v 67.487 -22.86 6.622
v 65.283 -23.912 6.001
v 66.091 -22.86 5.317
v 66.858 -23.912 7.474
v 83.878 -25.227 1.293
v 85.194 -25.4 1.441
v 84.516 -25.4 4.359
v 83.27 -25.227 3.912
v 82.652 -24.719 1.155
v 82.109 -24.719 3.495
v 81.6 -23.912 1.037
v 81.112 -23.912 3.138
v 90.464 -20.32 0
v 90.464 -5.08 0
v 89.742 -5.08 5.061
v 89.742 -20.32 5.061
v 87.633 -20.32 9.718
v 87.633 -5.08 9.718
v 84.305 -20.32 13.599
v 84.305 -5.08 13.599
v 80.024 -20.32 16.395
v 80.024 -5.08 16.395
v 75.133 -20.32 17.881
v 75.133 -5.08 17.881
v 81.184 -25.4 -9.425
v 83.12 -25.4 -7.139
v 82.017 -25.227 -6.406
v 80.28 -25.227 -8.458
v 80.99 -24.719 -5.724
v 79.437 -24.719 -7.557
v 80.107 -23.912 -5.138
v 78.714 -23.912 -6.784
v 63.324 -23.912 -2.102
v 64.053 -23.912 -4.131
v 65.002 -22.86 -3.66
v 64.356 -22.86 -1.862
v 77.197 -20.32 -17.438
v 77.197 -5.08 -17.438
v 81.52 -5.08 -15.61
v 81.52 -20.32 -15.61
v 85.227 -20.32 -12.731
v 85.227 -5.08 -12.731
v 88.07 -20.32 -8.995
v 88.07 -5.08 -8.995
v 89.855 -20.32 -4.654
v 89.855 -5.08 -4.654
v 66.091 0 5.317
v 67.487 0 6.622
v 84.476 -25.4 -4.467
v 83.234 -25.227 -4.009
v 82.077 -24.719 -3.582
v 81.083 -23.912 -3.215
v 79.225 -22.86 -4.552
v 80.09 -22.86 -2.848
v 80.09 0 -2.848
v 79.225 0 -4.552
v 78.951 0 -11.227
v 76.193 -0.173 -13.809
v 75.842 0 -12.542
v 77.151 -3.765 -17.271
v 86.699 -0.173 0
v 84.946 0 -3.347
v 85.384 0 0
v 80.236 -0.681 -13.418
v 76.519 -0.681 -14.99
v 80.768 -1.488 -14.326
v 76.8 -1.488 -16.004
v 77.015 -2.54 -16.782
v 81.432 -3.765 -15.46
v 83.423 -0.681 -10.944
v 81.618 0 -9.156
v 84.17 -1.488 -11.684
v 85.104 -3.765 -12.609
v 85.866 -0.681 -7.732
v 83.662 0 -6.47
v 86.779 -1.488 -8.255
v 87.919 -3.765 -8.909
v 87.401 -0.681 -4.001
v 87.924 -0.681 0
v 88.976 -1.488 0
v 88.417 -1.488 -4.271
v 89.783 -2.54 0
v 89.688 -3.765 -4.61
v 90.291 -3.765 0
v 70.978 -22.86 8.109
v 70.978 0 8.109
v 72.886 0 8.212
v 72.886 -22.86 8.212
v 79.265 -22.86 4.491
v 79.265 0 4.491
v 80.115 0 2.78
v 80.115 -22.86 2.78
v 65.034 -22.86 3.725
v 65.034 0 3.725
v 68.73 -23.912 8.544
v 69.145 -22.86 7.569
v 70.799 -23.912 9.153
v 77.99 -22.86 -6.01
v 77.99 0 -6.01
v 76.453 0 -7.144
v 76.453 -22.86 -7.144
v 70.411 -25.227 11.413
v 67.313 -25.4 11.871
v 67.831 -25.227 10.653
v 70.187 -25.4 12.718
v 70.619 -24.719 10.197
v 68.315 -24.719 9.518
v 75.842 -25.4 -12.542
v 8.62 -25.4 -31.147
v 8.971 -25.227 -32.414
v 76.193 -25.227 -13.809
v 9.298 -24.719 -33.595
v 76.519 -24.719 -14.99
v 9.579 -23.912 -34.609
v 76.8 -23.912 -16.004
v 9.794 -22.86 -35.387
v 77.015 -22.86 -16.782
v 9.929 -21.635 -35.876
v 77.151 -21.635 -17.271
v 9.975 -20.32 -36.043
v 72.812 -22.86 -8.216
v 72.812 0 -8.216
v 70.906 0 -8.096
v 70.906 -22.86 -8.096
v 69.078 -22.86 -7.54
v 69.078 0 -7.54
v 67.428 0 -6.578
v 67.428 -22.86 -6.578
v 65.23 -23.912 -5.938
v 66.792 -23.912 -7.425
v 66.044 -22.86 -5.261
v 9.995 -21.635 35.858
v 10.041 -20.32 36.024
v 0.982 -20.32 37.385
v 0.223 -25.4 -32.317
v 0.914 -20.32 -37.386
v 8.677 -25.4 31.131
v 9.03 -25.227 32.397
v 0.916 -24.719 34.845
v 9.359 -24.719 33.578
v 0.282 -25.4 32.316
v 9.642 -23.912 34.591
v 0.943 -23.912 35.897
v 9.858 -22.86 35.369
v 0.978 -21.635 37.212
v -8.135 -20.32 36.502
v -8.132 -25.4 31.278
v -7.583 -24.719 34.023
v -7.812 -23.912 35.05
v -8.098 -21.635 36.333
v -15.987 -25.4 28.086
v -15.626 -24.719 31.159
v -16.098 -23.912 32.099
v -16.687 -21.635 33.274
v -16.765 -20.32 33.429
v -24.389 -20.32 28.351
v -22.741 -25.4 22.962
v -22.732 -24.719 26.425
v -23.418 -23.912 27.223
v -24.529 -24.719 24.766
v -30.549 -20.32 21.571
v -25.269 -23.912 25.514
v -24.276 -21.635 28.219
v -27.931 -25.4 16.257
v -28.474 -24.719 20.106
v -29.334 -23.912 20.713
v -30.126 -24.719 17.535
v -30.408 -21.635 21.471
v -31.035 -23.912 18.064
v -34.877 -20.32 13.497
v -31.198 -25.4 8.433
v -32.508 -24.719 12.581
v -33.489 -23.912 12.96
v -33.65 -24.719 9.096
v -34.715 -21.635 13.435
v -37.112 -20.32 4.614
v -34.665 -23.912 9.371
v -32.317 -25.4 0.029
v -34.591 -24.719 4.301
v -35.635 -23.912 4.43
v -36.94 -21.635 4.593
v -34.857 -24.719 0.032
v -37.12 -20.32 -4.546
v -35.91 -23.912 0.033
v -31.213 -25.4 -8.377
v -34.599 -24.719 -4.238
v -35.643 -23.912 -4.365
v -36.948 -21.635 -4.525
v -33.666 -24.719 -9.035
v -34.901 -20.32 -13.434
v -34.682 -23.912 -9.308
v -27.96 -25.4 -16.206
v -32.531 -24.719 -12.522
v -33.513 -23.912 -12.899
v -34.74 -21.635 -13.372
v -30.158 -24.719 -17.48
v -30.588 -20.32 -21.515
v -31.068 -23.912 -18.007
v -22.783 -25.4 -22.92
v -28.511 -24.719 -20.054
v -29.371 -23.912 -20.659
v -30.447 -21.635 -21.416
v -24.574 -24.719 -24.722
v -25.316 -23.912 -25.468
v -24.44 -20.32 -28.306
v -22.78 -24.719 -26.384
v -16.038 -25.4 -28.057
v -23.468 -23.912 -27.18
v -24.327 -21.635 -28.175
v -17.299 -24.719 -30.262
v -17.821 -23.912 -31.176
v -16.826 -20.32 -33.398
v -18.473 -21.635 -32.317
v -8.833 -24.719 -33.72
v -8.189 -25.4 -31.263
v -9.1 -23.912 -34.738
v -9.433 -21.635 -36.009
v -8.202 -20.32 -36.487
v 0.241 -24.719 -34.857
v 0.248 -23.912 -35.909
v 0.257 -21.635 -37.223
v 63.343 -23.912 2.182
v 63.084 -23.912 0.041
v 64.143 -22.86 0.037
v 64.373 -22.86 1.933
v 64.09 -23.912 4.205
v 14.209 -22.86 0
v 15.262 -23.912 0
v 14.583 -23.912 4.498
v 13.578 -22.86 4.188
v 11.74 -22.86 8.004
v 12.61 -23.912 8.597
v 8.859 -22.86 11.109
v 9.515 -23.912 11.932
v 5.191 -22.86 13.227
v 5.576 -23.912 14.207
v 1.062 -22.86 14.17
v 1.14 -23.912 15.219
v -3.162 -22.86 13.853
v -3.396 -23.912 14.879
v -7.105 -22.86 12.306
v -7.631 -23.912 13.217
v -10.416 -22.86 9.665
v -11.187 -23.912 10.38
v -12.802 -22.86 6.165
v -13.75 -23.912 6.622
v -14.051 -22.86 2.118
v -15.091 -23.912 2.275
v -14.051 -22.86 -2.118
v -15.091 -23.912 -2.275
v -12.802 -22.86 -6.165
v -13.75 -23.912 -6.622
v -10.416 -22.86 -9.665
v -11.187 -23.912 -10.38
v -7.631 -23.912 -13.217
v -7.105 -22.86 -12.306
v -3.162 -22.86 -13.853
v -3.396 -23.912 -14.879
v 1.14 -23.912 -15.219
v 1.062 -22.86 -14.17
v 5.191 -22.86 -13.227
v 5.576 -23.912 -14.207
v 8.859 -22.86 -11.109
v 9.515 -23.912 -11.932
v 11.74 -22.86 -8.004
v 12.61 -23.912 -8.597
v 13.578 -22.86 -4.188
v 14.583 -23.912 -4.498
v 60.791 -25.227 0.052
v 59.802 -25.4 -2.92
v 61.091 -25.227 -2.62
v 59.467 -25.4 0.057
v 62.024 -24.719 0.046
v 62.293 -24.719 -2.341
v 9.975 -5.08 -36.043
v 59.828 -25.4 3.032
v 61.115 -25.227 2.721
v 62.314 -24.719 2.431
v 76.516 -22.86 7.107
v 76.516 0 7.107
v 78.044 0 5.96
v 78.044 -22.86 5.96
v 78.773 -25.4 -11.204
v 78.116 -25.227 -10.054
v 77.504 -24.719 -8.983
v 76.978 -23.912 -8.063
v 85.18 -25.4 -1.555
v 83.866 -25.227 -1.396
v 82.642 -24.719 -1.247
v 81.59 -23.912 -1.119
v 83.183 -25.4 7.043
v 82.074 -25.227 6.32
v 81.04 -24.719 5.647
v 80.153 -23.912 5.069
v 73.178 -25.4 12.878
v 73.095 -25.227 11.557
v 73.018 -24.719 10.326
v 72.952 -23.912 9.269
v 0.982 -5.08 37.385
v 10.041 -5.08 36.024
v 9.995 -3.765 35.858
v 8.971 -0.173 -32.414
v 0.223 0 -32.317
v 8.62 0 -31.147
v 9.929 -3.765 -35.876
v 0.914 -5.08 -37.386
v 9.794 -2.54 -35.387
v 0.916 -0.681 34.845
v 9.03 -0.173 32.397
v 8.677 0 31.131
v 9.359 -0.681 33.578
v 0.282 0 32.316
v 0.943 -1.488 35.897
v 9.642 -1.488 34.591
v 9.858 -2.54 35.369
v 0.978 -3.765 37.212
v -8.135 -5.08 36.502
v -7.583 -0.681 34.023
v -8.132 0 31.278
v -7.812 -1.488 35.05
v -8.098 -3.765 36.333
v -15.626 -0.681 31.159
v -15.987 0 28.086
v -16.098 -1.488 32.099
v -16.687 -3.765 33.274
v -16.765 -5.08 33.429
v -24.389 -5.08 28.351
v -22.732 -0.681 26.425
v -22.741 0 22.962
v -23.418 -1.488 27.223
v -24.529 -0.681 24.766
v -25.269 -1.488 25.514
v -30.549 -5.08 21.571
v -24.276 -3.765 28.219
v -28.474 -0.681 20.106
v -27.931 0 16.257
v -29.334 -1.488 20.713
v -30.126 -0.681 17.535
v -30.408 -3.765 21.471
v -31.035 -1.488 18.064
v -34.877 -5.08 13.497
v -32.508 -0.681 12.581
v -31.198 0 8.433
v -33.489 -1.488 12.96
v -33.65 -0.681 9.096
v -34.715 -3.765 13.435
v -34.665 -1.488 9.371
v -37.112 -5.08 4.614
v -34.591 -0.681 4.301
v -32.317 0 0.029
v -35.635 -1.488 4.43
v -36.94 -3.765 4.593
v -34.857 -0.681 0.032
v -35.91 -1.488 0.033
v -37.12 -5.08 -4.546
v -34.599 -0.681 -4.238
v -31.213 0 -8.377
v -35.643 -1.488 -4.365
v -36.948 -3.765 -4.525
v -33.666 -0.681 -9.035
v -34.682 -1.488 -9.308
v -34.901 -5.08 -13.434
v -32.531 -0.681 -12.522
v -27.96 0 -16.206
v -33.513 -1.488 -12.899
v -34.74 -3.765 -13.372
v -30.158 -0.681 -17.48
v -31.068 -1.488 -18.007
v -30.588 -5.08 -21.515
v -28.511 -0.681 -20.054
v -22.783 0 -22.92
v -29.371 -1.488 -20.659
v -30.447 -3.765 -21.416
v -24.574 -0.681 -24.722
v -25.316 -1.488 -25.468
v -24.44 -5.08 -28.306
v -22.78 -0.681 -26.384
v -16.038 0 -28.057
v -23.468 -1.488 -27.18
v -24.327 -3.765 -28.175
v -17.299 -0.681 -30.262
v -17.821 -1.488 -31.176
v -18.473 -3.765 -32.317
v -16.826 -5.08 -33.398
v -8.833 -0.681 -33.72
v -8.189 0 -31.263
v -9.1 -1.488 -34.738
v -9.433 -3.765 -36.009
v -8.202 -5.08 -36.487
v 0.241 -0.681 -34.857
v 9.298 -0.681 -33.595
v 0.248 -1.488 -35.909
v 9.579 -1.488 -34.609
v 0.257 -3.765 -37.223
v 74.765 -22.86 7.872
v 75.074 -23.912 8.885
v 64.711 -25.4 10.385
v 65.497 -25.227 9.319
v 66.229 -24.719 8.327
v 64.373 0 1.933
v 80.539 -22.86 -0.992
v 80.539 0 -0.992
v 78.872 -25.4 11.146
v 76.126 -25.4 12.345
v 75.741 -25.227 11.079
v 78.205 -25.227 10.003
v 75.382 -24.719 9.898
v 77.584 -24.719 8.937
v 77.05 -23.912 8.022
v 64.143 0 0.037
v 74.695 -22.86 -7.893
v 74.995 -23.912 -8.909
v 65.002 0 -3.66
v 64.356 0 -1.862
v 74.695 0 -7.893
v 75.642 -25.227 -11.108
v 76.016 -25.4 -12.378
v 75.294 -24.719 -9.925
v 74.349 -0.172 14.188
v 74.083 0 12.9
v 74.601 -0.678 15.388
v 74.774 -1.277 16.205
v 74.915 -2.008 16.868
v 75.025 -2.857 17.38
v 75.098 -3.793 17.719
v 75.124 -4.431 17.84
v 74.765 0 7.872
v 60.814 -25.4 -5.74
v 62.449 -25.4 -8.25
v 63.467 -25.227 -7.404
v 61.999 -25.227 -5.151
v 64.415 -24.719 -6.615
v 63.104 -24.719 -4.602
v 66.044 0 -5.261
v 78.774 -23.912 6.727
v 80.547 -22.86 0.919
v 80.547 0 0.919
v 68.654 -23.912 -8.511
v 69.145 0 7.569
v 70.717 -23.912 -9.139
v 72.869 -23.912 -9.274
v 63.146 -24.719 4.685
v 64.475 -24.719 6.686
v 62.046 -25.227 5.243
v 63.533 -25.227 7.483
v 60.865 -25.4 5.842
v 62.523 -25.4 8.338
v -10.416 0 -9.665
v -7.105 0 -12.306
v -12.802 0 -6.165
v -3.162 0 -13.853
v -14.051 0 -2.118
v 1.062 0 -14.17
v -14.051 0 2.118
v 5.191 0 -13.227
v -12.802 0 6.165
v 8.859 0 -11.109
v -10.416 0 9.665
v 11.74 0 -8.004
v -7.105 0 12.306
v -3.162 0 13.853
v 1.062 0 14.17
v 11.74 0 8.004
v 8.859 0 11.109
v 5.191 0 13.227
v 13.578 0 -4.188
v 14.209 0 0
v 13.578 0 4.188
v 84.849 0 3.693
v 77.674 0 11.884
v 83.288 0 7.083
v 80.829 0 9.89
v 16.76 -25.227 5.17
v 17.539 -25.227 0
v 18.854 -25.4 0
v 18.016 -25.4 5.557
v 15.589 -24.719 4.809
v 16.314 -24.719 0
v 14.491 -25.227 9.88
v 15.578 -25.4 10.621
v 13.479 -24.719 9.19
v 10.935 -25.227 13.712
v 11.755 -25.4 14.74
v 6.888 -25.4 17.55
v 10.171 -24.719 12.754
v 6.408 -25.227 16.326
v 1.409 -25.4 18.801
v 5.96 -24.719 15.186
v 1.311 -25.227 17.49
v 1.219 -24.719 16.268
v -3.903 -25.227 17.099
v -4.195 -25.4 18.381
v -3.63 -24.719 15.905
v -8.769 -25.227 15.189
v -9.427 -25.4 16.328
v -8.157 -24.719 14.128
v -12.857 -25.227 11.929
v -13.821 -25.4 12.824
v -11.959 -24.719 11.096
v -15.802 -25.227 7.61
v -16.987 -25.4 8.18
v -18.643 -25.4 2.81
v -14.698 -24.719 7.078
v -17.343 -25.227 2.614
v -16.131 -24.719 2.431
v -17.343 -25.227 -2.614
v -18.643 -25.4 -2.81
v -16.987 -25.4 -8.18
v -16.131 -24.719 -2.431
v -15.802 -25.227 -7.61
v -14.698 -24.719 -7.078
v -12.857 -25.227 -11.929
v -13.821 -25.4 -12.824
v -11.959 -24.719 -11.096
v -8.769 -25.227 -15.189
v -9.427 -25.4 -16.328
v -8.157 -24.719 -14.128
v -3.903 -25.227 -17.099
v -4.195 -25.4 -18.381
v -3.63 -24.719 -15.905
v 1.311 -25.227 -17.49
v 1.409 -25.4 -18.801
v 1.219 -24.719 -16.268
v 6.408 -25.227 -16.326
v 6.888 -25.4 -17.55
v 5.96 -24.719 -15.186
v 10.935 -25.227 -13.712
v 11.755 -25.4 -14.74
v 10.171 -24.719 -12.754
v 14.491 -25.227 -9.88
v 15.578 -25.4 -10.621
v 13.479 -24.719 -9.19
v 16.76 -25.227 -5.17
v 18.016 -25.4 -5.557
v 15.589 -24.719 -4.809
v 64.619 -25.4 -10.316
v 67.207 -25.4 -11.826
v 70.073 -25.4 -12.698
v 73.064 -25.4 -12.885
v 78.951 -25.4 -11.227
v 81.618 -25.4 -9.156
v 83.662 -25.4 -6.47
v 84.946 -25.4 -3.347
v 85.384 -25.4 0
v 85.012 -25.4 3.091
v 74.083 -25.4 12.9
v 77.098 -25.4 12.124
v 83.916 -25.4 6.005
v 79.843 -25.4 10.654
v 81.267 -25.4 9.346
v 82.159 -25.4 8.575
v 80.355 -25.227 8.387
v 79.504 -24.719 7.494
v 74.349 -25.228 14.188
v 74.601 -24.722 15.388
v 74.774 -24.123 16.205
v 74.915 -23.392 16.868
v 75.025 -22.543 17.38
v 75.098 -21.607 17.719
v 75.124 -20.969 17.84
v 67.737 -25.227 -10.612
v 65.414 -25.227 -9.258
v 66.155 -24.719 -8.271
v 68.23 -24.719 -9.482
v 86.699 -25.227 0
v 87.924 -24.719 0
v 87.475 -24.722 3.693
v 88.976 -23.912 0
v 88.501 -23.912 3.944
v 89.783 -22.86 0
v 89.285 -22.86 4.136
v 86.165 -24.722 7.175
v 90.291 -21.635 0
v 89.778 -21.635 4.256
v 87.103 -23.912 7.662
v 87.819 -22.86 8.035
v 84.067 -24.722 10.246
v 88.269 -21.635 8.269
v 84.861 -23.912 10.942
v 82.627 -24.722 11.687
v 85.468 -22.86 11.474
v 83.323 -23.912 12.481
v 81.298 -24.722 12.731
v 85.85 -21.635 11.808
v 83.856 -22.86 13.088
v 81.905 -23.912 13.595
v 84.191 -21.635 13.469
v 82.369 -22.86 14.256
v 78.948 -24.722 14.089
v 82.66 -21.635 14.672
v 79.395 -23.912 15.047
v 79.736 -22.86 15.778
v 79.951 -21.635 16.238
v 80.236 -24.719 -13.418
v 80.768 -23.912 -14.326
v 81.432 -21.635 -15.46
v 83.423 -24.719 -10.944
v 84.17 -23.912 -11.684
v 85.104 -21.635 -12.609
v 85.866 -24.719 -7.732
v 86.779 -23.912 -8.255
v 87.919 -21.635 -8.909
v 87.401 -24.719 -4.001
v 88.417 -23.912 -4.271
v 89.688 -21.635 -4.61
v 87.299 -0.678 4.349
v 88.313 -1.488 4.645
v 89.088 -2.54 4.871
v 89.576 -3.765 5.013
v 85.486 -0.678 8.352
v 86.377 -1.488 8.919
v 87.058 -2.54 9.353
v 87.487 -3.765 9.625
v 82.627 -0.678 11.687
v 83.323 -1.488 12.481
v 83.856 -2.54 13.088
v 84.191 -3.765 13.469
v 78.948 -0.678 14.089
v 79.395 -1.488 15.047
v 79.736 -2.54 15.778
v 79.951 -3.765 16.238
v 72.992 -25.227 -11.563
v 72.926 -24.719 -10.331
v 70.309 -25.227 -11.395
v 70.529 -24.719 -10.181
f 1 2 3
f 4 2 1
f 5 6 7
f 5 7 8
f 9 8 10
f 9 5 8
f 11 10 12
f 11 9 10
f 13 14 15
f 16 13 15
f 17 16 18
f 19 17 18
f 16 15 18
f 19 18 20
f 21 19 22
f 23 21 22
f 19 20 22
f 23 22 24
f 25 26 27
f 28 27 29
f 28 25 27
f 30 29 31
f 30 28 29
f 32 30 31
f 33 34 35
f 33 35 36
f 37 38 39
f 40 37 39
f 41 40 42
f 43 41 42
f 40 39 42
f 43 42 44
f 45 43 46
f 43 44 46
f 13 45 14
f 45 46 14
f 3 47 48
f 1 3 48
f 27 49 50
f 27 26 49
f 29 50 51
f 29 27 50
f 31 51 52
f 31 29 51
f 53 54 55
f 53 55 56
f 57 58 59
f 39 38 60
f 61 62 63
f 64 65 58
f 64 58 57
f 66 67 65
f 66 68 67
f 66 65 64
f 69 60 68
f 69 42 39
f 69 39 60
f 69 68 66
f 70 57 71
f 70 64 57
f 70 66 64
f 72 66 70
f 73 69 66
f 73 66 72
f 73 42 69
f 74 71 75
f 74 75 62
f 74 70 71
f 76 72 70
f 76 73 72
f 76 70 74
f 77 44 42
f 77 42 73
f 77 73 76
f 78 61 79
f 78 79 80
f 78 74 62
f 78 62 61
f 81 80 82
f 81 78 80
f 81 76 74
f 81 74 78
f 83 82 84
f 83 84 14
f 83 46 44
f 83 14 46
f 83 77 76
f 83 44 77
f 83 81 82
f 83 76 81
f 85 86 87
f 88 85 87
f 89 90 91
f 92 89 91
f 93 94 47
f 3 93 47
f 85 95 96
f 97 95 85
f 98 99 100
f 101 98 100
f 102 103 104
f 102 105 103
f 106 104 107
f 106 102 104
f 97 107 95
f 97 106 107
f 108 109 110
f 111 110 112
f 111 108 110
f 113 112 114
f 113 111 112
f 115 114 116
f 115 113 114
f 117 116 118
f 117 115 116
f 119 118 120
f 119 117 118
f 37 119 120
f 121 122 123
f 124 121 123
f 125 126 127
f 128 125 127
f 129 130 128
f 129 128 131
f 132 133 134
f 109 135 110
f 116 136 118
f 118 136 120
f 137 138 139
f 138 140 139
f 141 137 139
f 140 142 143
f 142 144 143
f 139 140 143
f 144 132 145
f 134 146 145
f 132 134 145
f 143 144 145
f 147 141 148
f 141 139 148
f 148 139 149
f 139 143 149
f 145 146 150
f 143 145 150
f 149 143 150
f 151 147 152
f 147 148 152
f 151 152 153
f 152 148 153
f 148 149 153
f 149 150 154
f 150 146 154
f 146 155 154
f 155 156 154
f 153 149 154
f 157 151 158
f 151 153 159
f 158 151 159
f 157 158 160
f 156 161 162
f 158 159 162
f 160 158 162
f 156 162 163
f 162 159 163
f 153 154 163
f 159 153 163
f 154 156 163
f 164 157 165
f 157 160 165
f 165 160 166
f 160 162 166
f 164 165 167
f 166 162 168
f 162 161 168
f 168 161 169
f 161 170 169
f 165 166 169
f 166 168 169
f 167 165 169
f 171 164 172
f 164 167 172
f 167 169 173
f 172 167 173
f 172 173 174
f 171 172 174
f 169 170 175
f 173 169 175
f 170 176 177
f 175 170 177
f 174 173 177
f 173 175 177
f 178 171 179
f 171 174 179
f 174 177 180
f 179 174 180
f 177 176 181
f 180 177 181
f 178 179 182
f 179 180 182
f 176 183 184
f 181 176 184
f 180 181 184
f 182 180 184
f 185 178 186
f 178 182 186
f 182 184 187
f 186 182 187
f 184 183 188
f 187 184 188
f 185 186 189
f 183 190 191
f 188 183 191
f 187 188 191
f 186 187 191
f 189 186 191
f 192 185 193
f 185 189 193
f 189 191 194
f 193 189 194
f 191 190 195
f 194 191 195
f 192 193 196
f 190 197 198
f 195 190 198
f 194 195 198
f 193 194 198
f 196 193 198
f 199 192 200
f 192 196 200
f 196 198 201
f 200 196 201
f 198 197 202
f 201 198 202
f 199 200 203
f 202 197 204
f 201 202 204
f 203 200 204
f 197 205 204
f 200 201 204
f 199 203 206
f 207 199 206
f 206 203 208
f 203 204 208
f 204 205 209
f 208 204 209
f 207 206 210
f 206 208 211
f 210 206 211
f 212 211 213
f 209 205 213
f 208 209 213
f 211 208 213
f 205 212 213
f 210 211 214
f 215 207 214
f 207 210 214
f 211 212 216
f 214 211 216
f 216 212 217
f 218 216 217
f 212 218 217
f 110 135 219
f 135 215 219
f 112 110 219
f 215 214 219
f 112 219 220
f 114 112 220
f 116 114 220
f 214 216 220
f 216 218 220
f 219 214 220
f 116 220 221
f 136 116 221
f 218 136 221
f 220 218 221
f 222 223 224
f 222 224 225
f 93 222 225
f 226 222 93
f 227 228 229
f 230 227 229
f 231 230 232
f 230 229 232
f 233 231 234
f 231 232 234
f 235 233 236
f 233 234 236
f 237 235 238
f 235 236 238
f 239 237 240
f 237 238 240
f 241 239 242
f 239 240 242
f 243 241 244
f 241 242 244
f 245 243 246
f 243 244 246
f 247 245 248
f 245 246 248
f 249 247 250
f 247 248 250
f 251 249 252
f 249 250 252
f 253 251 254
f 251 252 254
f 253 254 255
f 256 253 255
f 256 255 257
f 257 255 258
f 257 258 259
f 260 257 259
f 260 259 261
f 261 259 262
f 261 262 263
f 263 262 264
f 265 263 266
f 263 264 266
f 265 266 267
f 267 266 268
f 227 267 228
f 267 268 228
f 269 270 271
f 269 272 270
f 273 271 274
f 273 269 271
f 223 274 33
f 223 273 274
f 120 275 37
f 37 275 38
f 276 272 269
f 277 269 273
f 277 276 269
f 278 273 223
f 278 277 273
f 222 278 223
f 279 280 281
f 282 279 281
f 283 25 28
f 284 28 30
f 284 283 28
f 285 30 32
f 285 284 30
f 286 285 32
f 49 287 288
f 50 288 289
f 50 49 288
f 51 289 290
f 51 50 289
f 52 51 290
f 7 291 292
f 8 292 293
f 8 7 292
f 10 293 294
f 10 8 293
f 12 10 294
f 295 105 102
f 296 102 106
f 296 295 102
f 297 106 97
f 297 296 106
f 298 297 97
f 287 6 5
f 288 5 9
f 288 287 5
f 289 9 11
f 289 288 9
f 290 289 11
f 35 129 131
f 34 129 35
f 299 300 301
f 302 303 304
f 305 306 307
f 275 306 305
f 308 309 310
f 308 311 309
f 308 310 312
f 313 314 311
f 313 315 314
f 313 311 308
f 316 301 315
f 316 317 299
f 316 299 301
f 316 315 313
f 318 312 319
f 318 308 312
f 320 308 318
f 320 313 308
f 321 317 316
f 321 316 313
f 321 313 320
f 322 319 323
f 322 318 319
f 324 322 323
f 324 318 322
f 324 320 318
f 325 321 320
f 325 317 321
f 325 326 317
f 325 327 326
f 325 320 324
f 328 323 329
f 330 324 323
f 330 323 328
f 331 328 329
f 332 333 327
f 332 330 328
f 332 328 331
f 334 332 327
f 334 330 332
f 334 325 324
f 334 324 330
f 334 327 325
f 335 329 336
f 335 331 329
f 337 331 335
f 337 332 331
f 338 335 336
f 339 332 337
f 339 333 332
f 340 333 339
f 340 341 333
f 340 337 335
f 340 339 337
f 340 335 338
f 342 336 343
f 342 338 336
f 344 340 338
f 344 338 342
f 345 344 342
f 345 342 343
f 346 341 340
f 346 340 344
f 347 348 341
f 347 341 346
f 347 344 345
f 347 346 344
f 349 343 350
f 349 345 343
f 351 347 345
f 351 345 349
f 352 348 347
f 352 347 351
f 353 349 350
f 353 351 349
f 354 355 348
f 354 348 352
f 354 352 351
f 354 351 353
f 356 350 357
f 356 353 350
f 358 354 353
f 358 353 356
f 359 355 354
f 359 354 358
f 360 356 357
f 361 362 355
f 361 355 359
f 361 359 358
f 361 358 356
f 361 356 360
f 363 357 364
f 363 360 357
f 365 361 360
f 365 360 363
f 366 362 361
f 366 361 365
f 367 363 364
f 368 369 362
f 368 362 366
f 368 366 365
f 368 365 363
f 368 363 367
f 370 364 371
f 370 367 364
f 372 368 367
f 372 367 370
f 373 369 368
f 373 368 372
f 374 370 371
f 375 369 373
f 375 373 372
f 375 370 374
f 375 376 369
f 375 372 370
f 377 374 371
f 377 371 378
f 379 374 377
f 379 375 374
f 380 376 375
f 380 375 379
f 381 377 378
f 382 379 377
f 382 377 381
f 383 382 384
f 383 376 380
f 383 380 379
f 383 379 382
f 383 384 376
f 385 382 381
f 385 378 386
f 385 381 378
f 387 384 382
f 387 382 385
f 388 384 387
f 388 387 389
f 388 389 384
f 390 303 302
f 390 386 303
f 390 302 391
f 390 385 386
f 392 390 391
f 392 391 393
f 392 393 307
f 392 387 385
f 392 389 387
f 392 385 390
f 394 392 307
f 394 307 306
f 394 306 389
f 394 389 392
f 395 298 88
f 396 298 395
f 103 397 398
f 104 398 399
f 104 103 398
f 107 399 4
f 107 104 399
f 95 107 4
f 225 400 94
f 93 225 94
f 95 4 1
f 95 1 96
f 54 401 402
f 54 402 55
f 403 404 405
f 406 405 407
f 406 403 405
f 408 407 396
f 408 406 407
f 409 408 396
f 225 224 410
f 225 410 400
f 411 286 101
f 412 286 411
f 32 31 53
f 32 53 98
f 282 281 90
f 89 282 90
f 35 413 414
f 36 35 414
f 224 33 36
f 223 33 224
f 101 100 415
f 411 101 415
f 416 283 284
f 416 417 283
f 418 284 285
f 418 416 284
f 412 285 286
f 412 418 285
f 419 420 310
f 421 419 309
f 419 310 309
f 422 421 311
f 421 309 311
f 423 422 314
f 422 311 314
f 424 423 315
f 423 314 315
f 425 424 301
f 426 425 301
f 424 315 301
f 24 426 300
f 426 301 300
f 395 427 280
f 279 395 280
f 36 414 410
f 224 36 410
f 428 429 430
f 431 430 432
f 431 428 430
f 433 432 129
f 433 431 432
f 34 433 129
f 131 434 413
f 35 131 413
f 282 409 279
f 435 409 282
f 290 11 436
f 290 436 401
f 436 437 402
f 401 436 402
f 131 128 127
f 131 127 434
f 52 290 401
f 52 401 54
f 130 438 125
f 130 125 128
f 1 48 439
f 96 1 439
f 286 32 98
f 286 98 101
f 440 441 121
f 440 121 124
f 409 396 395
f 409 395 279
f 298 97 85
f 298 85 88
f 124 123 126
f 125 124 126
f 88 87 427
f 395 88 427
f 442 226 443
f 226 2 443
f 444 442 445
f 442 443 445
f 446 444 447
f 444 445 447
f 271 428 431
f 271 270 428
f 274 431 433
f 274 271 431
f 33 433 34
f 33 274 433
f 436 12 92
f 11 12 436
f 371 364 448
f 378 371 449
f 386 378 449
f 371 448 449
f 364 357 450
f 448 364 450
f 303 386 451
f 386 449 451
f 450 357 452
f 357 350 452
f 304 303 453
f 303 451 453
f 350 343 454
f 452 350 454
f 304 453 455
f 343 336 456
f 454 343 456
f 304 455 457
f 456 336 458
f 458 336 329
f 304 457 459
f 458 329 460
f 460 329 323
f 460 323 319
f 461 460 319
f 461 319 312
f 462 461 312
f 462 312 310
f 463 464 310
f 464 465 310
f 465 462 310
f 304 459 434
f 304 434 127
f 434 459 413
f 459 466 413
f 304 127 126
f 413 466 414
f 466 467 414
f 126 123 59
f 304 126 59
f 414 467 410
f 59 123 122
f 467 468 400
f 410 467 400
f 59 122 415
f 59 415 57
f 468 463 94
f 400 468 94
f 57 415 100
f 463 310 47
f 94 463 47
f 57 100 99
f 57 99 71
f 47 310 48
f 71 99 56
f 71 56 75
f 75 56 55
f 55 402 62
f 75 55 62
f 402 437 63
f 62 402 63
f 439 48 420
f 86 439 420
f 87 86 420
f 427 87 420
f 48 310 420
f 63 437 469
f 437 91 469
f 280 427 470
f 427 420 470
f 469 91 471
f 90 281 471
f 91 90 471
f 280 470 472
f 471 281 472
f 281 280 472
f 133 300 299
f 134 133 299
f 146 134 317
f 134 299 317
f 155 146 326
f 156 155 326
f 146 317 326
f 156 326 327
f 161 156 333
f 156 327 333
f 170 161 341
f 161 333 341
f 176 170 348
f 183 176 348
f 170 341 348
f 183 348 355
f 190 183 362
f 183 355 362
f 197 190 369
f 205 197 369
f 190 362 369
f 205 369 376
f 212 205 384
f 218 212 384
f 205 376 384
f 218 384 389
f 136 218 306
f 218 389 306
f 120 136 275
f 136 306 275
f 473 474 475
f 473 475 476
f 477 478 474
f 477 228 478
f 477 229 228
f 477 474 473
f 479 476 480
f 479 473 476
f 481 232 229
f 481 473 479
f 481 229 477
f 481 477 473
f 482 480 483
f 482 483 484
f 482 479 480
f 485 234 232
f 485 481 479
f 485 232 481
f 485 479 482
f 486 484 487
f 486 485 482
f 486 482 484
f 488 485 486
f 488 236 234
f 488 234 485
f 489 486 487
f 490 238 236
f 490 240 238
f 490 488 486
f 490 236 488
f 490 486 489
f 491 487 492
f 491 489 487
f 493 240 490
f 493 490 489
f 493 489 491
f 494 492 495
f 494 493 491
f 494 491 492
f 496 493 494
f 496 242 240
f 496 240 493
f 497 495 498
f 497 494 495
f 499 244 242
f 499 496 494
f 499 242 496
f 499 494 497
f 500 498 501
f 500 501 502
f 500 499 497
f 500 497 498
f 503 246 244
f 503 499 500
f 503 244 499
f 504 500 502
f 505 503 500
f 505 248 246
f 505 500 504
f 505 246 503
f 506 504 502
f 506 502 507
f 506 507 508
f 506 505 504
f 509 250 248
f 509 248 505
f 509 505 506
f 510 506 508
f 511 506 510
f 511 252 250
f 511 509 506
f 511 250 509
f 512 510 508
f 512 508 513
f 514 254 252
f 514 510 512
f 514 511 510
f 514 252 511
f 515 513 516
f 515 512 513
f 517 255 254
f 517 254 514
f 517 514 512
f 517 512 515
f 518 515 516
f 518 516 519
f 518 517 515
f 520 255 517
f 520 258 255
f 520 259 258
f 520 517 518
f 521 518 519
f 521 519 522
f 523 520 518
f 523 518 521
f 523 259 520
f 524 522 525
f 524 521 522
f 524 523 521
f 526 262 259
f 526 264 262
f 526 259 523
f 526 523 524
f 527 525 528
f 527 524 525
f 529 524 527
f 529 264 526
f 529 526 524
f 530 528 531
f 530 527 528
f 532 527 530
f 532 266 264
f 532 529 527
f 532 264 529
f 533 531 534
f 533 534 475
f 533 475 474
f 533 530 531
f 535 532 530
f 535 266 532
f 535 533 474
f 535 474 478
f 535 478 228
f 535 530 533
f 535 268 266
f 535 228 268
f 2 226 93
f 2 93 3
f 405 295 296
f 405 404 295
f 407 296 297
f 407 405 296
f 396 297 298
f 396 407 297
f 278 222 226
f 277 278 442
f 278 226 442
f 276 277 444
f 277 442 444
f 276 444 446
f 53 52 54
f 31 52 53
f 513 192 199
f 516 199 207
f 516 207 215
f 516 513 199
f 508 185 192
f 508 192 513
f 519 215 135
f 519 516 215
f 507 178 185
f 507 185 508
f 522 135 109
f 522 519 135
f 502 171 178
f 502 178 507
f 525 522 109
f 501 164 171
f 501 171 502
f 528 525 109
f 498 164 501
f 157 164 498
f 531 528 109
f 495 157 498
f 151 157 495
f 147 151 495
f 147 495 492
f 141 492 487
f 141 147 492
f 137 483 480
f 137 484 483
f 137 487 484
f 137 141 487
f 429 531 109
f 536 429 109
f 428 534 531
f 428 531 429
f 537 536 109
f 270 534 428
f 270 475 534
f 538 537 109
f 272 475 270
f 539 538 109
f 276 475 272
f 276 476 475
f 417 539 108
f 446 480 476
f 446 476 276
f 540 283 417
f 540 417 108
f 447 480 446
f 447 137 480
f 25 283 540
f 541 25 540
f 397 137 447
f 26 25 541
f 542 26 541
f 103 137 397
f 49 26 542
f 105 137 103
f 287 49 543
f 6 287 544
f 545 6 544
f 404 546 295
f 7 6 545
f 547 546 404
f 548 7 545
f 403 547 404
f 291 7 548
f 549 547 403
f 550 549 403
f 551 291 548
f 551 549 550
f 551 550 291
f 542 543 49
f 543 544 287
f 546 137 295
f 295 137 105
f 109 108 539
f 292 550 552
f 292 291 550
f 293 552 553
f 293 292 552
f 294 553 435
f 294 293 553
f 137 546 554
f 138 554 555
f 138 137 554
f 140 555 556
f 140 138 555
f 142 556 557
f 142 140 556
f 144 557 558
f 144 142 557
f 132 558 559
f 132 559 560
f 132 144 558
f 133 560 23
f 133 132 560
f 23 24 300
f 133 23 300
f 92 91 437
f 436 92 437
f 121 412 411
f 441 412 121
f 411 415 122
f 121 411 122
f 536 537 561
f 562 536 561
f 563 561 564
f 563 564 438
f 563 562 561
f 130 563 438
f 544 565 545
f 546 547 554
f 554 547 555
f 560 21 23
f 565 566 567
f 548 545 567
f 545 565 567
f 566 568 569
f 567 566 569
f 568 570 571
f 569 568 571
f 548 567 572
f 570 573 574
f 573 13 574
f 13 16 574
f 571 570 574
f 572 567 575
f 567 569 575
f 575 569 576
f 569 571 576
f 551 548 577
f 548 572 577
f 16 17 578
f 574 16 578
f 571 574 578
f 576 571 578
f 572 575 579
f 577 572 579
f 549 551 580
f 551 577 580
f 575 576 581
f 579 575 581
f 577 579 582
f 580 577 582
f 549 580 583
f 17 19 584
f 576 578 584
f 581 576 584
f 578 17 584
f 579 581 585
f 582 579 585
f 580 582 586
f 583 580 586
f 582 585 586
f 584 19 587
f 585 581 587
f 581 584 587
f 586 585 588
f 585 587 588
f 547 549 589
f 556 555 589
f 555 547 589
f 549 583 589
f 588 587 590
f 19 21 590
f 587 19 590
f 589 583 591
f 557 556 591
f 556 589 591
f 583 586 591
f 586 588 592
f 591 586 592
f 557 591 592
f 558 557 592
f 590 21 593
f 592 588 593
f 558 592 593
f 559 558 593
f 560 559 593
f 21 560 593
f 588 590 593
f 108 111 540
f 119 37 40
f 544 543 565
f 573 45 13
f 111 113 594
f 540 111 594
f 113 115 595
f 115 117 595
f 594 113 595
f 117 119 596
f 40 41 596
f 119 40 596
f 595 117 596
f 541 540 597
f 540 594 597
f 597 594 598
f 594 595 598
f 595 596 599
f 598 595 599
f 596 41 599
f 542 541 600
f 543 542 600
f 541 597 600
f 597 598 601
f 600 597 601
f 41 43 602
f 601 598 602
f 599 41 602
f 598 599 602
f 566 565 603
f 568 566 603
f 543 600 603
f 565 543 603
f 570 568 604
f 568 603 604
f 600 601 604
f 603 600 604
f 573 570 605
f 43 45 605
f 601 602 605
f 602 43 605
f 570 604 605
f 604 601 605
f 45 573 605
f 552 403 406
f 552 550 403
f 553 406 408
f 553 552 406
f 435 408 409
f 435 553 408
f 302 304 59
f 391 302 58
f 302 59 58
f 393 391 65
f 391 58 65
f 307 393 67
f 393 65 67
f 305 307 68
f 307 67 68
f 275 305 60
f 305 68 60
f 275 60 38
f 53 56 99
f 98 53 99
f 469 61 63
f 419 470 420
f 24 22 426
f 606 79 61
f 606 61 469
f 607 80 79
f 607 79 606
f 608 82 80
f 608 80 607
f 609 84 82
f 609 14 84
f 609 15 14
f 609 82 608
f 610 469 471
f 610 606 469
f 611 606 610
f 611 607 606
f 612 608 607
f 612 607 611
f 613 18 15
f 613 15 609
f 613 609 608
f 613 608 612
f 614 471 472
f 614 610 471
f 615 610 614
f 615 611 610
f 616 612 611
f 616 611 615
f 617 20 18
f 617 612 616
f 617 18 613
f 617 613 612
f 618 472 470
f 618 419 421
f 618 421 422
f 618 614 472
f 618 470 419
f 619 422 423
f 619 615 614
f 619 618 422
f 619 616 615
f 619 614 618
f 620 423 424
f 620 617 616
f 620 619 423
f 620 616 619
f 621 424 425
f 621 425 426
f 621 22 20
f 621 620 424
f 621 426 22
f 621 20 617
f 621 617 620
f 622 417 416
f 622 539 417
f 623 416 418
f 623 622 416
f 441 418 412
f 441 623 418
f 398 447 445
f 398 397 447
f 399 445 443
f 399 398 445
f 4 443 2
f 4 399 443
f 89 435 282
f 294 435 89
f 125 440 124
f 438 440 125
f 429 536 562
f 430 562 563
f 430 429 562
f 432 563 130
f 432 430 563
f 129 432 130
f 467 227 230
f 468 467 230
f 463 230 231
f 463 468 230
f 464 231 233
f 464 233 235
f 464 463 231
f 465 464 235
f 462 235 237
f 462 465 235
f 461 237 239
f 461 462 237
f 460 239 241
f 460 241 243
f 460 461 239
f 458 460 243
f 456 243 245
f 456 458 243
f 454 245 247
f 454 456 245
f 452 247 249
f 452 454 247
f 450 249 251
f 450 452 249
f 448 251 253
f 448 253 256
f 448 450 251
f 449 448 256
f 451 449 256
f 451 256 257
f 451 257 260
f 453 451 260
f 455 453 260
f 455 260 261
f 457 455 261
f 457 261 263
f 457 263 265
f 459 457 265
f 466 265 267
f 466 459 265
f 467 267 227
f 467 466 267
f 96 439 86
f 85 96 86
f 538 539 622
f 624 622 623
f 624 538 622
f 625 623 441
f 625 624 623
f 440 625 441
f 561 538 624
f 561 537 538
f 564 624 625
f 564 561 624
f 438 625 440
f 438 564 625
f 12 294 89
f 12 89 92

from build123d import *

# Parameters (mm, degrees)
F0_R     = 14.20941
F1_DEPTH = 25.4
F2_SIZE  = 2.54
F3_R     = 5.08


with BuildPart() as f1:
    # F0 (on Front) → F1 (new body)
    with BuildSketch(Plane.XZ):
        with BuildLine():
            ThreePointArc((9.975388, -36.042502), (29.762598, -22.644161), (37.397464, 0))
            ThreePointArc((37.397464, 0), (29.783212, 22.617041), (10.041033, 36.024269))
            ThreePointArc((10.041033, 36.024269), (-37.397448, 0.034065), (9.975388, -36.042502))
        make_face()
        Circle(F0_R, mode=Mode.SUBTRACT)
        with BuildLine():
            ThreePointArc((10.041033, 36.024269), (29.783212, 22.617041), (37.397464, 0))
            ThreePointArc((37.397464, 0), (29.762598, -22.644161), (9.975388, -36.042502))
            Line((9.975388, -36.042502), (77.196848, -17.437796))
            ThreePointArc((77.196848, -17.437796), (54.30811, -1.055577), (75.132796, 17.881262))
            Line((75.132796, 17.881262), (10.041033, 36.024269))
        make_face()
        with BuildLine():
            ThreePointArc((90.463979, 0), (86.106461, 11.776934), (75.132796, 17.881262))
            ThreePointArc((75.132796, 17.881262), (54.30811, -1.055577), (77.196848, -17.437796))
            ThreePointArc((77.196848, -17.437796), (86.770139, -10.955518), (90.463979, 0))
        make_face()
        Polygon((66.091331, 5.316778), (67.486724, 6.621571), (69.14541, 7.569393), (70.977968, 8.109147), (72.885606, 8.211735), (74.765481, 7.871627), (76.51625, 7.107156), (78.043527, 5.959538), (79.264978, 4.490639), (80.114752, 2.779648), (80.54704, 0.918806), (80.538535, -0.991569), (80.089696, -2.848488), (79.224722, -4.551845), (77.990241, -6.00981), (76.452806, -7.143785), (74.695301, -7.892637), (72.812471, -8.215995), (70.905823, -8.096426), (69.078143, -7.540377), (67.427962, -6.577824), (66.044242, -5.260659), (65.001579, -3.65989), (64.356184, -1.861816), (64.14285, 0.036629), (64.373079, 1.9331), (65.034457, 3.725356), align=None, mode=Mode.SUBTRACT)
    extrude(amount=F1_DEPTH)

    # F2
    f2_edges = [f1.edges().sort_by_distance(p)[0] for p in [
        (-14.20941, -25.4, 0),
        (75.640865, -25.4, 7.489391),
        (78.607481, -25.4, -5.280828),
        (65.52291, -25.4, -4.460275),
        (77.279888, -25.4, 6.533347),
        (77.221524, -25.4, -6.576798),
        (64.678881, -25.4, -2.760853),
        (78.654252, -25.4, 5.225088),
        (75.574053, -25.4, -7.518211),
        (64.249517, -25.4, -0.912594),
        (79.689865, -25.4, 3.635143),
        (73.753886, -25.4, -8.054316),
        (64.257964, -25.4, 0.984864),
        (68.316067, -25.4, 7.095482),
        (80.330896, -25.4, 1.849227),
        (71.859147, -25.4, -8.15621),
        (64.703768, -25.4, 2.829228),
        (70.061689, -25.4, 7.83927),
        (80.542787, -25.4, -0.036381),
        (69.991983, -25.4, -7.818401),
        (65.562894, -25.4, 4.521067),
        (71.931787, -25.4, 8.160441),
        (80.314116, -25.4, -1.920029),
        (68.253052, -25.4, -7.0591),
        (66.789027, -25.4, 5.969174),
        (73.825543, -25.4, 8.041681),
        (66.736102, -25.4, -5.919241),
        (79.657209, -25.4, -3.700167),
    ]]
    chamfer(f2_edges, length=F2_SIZE)

    # F3
    f3_edges = [f1.edges().sort_by_distance(p)[0] for p in [
        (-16.74941, -25.4, 0),
        (-37.397448, -25.4, 0.034065),
        (43.586118, -25.4, -26.740149),
        (90.433161, -25.4, 1.055577),
        (42.586915, -25.4, 26.952766),
        (76.657281, -25.4, 9.817159),
        (74.277741, -25.4, 10.541104),
        (78.805726, -25.4, 8.563967),
        (71.795389, -25.4, 10.696776),
        (80.607254, -25.4, 6.84909),
        (69.344048, -25.4, 10.275782),
        (81.964744, -25.4, 4.764977),
        (67.055872, -25.4, 9.300818),
        (82.805013, -25.4, 2.423983),
        (65.054216, -25.4, 7.824445),
        (83.082762, -25.4, -0.047689),
        (63.44699, -25.4, 5.926253),
        (82.783017, -25.4, -2.51679),
        (62.32084, -25.4, 3.708576),
        (81.921939, -25.4, -4.85021),
        (61.736477, -25.4, 1.290969),
        (80.545947, -25.4, -6.922154),
        (61.725404, -25.4, -1.196235),
        (78.729221, -25.4, -8.620923),
        (62.288218, -25.4, -3.61895),
        (76.569703, -25.4, -9.854936),
        (63.394579, -25.4, -5.846566),
        (74.183812, -25.4, -10.557666),
        (64.98484, -25.4, -7.758992),
        (71.700172, -25.4, -10.691231),
        (66.973272, -25.4, -9.253129),
        (69.252677, -25.4, -10.248428),
        (43.586118, 0, -26.740149),
    ]]
    fillet(f3_edges, radius=F3_R)


solid = f1.part
